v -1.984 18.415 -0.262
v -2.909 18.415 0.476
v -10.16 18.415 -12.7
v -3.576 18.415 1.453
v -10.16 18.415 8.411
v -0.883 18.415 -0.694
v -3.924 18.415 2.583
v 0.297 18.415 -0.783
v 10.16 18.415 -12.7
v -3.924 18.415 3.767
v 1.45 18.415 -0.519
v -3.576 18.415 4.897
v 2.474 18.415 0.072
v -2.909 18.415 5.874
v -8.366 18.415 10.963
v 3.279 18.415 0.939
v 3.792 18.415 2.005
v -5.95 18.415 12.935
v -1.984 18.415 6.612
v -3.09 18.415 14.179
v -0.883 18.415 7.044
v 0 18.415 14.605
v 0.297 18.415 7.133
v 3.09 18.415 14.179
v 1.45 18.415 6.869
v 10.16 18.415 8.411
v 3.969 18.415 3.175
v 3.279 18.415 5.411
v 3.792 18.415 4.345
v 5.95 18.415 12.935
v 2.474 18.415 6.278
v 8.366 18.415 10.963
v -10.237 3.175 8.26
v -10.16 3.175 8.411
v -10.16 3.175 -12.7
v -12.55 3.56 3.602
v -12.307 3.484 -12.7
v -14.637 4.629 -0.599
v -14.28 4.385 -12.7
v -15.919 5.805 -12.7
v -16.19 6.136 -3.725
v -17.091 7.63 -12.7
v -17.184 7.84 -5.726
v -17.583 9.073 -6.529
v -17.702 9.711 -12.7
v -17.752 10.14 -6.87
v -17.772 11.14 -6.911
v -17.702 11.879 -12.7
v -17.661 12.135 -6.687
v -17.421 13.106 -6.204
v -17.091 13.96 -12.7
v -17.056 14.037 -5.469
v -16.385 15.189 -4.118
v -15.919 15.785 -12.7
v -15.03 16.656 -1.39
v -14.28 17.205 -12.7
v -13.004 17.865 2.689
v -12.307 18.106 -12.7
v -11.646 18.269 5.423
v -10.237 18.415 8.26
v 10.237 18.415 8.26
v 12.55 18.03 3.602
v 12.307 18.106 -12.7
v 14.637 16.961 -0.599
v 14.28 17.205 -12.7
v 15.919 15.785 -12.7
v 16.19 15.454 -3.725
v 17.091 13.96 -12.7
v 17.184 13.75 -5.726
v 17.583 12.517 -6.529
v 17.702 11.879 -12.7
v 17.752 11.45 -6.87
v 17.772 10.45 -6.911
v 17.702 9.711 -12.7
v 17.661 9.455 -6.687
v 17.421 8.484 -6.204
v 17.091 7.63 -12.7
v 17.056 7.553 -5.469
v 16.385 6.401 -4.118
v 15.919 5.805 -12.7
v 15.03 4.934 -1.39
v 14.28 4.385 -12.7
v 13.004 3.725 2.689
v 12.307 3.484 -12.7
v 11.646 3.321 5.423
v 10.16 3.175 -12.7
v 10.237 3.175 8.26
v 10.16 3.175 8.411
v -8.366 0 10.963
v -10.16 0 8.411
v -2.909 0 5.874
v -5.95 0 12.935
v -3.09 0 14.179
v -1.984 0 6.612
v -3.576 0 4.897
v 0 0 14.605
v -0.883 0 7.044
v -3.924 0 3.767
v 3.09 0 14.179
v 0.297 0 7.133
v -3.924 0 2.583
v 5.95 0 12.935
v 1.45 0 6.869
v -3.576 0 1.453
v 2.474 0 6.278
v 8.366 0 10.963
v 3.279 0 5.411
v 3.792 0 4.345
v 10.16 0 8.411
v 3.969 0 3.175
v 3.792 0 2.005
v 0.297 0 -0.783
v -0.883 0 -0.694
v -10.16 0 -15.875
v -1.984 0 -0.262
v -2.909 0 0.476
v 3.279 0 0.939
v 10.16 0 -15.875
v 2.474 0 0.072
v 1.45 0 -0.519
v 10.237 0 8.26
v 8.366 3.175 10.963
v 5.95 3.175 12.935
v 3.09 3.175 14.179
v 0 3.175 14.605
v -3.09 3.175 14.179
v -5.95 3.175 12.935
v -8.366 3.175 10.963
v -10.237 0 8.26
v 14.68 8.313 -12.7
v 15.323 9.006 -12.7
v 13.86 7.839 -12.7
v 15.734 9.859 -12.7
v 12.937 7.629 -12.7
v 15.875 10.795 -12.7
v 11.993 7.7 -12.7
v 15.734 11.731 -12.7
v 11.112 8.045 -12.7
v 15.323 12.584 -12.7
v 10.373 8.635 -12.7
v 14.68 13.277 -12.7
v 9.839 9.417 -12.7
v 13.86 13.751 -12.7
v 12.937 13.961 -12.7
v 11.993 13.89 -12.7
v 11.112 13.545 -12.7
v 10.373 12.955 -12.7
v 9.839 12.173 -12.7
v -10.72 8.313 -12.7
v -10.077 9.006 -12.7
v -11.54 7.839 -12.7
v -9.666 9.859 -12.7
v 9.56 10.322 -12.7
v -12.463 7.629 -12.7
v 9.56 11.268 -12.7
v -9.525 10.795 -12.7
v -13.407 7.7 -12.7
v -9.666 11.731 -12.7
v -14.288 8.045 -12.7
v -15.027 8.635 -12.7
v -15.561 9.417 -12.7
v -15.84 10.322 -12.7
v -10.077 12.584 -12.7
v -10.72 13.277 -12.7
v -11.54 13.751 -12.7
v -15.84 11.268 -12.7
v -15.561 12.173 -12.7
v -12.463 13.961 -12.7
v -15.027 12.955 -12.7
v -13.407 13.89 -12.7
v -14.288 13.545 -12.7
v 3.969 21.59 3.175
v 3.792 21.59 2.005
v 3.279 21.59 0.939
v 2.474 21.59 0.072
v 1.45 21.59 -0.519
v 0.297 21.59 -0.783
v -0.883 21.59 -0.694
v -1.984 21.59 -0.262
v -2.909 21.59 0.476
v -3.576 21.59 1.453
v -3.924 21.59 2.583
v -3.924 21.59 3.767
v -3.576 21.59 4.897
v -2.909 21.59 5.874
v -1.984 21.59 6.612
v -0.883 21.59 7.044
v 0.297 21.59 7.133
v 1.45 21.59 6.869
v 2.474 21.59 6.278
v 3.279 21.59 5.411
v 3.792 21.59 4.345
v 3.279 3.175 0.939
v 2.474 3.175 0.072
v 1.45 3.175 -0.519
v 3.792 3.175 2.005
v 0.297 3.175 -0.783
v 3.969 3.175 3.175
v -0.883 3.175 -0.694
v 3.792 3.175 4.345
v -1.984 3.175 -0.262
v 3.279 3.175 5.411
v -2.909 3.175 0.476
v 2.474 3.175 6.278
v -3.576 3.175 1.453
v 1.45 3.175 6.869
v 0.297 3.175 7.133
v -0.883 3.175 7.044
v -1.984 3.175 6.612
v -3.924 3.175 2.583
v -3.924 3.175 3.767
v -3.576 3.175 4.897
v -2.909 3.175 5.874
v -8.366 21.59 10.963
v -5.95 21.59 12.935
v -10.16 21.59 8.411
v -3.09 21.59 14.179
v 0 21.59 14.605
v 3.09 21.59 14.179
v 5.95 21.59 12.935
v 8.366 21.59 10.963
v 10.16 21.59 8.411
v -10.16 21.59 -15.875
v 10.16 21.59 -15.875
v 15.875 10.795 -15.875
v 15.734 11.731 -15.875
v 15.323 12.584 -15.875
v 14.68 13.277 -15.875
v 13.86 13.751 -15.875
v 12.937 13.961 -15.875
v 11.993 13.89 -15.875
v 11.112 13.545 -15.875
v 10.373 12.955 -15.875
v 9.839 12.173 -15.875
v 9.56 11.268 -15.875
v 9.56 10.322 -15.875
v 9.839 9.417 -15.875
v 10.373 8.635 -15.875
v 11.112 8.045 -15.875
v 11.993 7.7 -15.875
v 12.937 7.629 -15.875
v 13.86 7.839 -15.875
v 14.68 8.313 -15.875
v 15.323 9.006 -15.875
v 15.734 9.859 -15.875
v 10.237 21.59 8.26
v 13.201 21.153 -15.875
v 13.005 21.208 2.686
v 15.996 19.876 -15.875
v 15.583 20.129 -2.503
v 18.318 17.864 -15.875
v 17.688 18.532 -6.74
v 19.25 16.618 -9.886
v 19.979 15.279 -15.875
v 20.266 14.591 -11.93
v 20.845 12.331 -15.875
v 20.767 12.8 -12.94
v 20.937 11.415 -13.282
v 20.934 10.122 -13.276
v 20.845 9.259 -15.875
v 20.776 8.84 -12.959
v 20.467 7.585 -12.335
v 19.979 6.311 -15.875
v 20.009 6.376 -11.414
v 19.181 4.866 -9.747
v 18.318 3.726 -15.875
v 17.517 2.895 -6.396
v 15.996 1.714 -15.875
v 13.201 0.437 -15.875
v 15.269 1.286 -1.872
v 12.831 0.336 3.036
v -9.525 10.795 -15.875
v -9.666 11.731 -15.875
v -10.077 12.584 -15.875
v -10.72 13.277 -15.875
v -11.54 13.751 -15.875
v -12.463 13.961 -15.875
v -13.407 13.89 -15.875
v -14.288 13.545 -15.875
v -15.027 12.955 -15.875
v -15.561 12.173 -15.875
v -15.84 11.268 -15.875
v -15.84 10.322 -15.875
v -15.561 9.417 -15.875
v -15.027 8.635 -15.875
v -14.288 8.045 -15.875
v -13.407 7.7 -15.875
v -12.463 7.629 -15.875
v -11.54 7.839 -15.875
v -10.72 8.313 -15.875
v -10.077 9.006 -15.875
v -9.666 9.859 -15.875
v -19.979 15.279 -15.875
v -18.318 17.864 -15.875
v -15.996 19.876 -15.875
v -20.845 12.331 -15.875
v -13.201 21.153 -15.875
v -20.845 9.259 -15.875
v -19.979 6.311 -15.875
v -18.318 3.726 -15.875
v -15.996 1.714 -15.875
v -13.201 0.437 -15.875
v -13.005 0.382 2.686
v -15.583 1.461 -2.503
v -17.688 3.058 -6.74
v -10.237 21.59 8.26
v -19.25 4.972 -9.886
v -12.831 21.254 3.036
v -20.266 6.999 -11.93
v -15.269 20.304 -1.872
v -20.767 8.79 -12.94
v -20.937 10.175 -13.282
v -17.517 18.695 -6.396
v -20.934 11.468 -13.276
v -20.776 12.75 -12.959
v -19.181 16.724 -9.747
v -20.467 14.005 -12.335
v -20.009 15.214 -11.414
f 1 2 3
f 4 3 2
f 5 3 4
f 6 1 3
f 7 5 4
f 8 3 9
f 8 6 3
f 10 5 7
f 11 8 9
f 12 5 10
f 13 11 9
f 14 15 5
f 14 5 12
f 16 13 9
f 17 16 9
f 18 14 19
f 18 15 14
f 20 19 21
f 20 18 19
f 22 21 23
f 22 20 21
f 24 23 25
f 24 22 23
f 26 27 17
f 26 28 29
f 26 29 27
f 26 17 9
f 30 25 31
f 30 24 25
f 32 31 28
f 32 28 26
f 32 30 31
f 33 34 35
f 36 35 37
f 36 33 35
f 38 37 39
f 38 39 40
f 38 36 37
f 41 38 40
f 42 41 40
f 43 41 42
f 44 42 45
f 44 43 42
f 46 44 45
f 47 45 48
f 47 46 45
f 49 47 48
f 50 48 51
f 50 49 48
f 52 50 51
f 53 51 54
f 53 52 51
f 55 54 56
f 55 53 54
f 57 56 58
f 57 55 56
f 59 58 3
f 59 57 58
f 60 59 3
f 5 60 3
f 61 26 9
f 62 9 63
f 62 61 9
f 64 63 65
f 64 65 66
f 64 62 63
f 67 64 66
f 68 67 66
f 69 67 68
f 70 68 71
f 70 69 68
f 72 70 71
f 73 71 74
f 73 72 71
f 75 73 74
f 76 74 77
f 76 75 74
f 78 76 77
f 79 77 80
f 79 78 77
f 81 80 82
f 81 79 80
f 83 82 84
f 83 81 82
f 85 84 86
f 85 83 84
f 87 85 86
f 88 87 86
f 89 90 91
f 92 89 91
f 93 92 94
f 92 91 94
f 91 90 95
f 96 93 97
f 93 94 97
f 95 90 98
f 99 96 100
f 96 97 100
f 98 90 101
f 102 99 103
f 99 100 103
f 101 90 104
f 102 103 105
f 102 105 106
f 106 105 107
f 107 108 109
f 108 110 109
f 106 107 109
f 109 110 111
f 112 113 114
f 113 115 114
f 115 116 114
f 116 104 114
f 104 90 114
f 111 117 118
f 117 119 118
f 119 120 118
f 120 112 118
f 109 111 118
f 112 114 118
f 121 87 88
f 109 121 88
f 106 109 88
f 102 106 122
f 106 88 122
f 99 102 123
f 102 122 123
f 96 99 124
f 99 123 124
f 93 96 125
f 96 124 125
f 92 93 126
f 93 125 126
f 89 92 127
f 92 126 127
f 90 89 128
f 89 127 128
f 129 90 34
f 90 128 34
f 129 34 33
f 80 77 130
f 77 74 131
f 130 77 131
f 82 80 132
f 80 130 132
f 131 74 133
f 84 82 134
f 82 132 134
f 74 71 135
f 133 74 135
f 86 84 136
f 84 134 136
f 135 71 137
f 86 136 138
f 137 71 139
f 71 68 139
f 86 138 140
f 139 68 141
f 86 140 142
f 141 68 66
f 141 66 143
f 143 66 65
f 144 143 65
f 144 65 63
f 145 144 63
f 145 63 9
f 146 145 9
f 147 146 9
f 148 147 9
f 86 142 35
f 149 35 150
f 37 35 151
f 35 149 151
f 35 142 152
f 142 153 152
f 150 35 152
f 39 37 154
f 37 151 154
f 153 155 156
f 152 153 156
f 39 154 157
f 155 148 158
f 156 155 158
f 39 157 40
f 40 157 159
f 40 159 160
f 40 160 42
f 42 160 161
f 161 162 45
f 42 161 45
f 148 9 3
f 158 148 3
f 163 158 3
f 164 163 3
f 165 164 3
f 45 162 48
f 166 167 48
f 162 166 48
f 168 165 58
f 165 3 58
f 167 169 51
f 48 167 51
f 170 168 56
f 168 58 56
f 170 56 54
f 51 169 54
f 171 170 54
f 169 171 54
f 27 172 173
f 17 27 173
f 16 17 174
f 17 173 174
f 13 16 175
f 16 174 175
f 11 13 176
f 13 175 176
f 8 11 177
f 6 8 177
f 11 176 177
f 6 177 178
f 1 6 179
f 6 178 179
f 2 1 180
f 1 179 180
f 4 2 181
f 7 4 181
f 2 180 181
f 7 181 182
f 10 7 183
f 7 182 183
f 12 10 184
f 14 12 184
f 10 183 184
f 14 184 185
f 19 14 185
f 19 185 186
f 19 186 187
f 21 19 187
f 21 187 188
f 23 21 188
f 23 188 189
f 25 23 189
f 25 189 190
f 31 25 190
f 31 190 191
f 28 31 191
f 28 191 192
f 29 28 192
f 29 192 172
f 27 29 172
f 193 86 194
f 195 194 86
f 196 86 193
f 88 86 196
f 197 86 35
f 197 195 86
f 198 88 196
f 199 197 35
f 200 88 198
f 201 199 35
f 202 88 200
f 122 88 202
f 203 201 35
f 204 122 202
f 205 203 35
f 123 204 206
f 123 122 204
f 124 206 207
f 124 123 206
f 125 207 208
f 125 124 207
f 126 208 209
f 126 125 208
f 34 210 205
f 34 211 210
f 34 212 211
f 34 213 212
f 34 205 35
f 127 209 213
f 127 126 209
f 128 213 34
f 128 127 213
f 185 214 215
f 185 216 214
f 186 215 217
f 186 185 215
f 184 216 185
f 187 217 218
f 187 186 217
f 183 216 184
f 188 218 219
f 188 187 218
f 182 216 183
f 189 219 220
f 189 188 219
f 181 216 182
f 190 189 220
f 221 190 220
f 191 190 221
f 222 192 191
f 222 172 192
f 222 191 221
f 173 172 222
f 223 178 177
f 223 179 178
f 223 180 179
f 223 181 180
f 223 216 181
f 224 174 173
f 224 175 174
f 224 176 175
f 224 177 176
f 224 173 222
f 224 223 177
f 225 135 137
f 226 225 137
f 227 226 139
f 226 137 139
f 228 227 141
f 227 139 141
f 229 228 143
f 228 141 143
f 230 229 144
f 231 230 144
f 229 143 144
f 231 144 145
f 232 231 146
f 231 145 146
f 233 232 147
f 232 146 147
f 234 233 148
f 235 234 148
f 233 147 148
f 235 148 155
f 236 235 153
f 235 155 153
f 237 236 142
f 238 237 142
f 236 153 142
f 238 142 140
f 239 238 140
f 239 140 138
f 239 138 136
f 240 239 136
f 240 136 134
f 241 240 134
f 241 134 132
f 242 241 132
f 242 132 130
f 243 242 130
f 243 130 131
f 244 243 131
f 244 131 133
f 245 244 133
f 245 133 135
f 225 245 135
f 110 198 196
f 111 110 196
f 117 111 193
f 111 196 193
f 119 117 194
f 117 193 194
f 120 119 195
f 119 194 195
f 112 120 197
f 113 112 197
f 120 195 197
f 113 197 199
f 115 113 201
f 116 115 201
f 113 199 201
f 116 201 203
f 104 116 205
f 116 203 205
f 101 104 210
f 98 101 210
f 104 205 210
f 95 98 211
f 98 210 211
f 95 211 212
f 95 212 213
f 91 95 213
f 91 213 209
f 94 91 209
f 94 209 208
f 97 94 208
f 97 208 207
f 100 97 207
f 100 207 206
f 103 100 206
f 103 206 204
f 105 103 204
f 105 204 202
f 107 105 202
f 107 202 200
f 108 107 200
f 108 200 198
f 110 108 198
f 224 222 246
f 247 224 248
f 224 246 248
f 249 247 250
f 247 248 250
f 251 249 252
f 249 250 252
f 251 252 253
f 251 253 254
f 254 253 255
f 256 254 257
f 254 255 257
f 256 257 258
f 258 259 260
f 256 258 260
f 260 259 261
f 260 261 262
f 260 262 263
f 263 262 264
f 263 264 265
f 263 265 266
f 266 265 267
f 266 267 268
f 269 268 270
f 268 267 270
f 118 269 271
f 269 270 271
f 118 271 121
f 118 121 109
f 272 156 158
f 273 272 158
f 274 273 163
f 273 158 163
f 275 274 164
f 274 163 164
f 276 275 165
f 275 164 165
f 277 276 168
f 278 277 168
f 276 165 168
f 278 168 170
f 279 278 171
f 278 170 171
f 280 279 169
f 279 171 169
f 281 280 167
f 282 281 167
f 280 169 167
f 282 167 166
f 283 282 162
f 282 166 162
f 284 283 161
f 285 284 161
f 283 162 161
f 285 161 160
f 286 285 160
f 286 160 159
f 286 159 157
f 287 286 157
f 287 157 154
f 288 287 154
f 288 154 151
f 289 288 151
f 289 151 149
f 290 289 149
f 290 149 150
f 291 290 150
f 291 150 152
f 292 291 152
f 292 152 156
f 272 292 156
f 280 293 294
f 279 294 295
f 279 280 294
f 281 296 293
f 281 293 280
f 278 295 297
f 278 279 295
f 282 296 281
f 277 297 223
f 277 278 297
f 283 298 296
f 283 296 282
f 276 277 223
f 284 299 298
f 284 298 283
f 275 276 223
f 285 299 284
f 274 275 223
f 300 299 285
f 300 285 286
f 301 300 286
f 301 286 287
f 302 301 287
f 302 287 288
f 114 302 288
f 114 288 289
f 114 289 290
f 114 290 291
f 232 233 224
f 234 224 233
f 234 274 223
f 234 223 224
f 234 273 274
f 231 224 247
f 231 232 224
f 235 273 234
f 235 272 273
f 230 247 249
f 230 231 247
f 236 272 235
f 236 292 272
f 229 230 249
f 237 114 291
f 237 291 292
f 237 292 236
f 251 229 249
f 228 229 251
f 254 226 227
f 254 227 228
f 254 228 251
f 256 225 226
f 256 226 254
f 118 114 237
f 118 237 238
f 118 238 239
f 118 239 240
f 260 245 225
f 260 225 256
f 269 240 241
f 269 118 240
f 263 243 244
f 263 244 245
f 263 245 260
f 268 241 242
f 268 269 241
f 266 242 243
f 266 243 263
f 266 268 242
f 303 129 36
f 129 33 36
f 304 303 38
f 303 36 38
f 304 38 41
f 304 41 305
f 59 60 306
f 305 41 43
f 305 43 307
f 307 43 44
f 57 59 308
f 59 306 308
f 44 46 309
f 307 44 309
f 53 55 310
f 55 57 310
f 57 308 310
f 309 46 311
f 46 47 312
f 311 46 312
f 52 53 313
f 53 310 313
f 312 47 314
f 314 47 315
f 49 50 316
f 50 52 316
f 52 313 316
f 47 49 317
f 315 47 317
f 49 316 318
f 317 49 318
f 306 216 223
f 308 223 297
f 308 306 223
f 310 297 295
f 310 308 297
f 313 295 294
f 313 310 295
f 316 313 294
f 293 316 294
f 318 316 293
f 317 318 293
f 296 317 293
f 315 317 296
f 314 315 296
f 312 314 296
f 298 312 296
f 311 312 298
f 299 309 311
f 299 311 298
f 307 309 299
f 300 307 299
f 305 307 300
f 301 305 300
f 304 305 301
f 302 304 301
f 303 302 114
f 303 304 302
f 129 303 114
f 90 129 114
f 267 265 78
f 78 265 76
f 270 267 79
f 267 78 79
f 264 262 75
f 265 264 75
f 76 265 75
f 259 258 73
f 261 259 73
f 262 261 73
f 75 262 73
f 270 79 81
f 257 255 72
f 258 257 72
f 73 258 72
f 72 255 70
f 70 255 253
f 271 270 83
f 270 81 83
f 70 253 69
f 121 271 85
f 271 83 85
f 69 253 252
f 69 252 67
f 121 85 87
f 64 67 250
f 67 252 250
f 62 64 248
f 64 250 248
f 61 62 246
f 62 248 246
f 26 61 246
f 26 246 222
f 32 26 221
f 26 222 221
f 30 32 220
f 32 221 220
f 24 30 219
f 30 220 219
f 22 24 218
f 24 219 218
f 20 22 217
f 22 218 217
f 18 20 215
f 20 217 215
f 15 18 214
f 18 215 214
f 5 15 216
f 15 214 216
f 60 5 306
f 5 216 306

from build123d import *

# Parameters (mm, degrees)
SKETCH1_W          = 44.45
SKETCH1_H          = 31.75
BILLET_DEPTH       = 21.59
SKETCH2_R          = 3.96875
MILL_CUT_1_DEPTH   = 22.59
CUT_EXTRUDE1_DEPTH = 27.305
CUT_EXTRUDE2_DEPTH = 31.48
SKETCH9_R          = 3.175
HOLES_DEPTH        = 4.1750001


with BuildPart() as part:
    # Sketch1 → Billet (new body)
    with BuildSketch(Plane(origin=(0, 0, 0), x_dir=(1, 0, 0), z_dir=(0, 1, 0))):
        Rectangle(SKETCH1_W, SKETCH1_H)
    extrude(amount=BILLET_DEPTH)

    # Sketch2 → Mill Cut 1 (cut, through all)
    with BuildSketch(Plane(origin=(0, 21.59, 0), x_dir=(1, 0, 0), z_dir=(0, 1, 0))):
        with Locations((0, -3.175)):
            Circle(SKETCH2_R)
        with BuildLine():
            Line((-10.236684927, -8.259799082), (-22.225, 15.875))
            Line((-22.225, 15.875), (-22.225, -15.875))
            Line((-22.225, -15.875), (22.225, -15.875))
            Line((22.225, -15.875), (22.225, 15.875))
            Line((22.225, 15.875), (10.236684927, -8.259799082))
            ThreePointArc((10.236684927, -8.259799082), (0, -14.605), (-10.236684927, -8.259799082))
        make_face()
    extrude(amount=-MILL_CUT_1_DEPTH, mode=Mode.SUBTRACT)

    # Sketch6 → Cut-Extrude1 (cut)
    with BuildSketch(Plane(origin=(0, 21.59, 14.605), x_dir=(1, 0, 0), z_dir=(0, 0, 1))):
        with BuildLine():
            Line((-10.16, -3.175), (10.16, -3.175))
            ThreePointArc((10.16, -3.175), (17.78, -10.795), (10.16, -18.415))
            Line((10.16, -18.415), (-10.16, -18.415))
            ThreePointArc((-10.16, -18.415), (-17.78, -10.795), (-10.16, -3.175))
        make_face()
    extrude(amount=-CUT_EXTRUDE1_DEPTH, mode=Mode.SUBTRACT)

    # Sketch8 → Cut-Extrude2 (cut, through all)
    with BuildSketch(Plane(origin=(0, 21.59, 14.605), x_dir=(1, 0, 0), z_dir=(0, 0, 1))):
        with BuildLine():
            Line((-10.16, -21.59), (-60.96, -21.59))
            Line((-60.96, -21.59), (-60.96, 0))
            Line((-60.96, 0), (-10.16, 0))
            ThreePointArc((-10.16, 0), (-20.955, -10.795), (-10.16, -21.59))
        make_face()
    cut_extrude2 = extrude(amount=-CUT_EXTRUDE2_DEPTH, mode=Mode.SUBTRACT)

    # Mirror1: Cut-Extrude2 across plane
    add(cut_extrude2.mirror(Plane(origin=(0, 0, 0), x_dir=(0, 0, 1), z_dir=(1, 0, 0))), mode=Mode.SUBTRACT)

    # Sketch9 → Holes (cut, through all)
    with BuildSketch(Plane.XY.offset(-12.7)):
        with Locations((12.7, 10.795)):
            Circle(SKETCH9_R)
        with Locations((-12.7, 10.795)):
            Circle(SKETCH9_R)
    extrude(amount=-HOLES_DEPTH, mode=Mode.SUBTRACT)


solid = part.part
